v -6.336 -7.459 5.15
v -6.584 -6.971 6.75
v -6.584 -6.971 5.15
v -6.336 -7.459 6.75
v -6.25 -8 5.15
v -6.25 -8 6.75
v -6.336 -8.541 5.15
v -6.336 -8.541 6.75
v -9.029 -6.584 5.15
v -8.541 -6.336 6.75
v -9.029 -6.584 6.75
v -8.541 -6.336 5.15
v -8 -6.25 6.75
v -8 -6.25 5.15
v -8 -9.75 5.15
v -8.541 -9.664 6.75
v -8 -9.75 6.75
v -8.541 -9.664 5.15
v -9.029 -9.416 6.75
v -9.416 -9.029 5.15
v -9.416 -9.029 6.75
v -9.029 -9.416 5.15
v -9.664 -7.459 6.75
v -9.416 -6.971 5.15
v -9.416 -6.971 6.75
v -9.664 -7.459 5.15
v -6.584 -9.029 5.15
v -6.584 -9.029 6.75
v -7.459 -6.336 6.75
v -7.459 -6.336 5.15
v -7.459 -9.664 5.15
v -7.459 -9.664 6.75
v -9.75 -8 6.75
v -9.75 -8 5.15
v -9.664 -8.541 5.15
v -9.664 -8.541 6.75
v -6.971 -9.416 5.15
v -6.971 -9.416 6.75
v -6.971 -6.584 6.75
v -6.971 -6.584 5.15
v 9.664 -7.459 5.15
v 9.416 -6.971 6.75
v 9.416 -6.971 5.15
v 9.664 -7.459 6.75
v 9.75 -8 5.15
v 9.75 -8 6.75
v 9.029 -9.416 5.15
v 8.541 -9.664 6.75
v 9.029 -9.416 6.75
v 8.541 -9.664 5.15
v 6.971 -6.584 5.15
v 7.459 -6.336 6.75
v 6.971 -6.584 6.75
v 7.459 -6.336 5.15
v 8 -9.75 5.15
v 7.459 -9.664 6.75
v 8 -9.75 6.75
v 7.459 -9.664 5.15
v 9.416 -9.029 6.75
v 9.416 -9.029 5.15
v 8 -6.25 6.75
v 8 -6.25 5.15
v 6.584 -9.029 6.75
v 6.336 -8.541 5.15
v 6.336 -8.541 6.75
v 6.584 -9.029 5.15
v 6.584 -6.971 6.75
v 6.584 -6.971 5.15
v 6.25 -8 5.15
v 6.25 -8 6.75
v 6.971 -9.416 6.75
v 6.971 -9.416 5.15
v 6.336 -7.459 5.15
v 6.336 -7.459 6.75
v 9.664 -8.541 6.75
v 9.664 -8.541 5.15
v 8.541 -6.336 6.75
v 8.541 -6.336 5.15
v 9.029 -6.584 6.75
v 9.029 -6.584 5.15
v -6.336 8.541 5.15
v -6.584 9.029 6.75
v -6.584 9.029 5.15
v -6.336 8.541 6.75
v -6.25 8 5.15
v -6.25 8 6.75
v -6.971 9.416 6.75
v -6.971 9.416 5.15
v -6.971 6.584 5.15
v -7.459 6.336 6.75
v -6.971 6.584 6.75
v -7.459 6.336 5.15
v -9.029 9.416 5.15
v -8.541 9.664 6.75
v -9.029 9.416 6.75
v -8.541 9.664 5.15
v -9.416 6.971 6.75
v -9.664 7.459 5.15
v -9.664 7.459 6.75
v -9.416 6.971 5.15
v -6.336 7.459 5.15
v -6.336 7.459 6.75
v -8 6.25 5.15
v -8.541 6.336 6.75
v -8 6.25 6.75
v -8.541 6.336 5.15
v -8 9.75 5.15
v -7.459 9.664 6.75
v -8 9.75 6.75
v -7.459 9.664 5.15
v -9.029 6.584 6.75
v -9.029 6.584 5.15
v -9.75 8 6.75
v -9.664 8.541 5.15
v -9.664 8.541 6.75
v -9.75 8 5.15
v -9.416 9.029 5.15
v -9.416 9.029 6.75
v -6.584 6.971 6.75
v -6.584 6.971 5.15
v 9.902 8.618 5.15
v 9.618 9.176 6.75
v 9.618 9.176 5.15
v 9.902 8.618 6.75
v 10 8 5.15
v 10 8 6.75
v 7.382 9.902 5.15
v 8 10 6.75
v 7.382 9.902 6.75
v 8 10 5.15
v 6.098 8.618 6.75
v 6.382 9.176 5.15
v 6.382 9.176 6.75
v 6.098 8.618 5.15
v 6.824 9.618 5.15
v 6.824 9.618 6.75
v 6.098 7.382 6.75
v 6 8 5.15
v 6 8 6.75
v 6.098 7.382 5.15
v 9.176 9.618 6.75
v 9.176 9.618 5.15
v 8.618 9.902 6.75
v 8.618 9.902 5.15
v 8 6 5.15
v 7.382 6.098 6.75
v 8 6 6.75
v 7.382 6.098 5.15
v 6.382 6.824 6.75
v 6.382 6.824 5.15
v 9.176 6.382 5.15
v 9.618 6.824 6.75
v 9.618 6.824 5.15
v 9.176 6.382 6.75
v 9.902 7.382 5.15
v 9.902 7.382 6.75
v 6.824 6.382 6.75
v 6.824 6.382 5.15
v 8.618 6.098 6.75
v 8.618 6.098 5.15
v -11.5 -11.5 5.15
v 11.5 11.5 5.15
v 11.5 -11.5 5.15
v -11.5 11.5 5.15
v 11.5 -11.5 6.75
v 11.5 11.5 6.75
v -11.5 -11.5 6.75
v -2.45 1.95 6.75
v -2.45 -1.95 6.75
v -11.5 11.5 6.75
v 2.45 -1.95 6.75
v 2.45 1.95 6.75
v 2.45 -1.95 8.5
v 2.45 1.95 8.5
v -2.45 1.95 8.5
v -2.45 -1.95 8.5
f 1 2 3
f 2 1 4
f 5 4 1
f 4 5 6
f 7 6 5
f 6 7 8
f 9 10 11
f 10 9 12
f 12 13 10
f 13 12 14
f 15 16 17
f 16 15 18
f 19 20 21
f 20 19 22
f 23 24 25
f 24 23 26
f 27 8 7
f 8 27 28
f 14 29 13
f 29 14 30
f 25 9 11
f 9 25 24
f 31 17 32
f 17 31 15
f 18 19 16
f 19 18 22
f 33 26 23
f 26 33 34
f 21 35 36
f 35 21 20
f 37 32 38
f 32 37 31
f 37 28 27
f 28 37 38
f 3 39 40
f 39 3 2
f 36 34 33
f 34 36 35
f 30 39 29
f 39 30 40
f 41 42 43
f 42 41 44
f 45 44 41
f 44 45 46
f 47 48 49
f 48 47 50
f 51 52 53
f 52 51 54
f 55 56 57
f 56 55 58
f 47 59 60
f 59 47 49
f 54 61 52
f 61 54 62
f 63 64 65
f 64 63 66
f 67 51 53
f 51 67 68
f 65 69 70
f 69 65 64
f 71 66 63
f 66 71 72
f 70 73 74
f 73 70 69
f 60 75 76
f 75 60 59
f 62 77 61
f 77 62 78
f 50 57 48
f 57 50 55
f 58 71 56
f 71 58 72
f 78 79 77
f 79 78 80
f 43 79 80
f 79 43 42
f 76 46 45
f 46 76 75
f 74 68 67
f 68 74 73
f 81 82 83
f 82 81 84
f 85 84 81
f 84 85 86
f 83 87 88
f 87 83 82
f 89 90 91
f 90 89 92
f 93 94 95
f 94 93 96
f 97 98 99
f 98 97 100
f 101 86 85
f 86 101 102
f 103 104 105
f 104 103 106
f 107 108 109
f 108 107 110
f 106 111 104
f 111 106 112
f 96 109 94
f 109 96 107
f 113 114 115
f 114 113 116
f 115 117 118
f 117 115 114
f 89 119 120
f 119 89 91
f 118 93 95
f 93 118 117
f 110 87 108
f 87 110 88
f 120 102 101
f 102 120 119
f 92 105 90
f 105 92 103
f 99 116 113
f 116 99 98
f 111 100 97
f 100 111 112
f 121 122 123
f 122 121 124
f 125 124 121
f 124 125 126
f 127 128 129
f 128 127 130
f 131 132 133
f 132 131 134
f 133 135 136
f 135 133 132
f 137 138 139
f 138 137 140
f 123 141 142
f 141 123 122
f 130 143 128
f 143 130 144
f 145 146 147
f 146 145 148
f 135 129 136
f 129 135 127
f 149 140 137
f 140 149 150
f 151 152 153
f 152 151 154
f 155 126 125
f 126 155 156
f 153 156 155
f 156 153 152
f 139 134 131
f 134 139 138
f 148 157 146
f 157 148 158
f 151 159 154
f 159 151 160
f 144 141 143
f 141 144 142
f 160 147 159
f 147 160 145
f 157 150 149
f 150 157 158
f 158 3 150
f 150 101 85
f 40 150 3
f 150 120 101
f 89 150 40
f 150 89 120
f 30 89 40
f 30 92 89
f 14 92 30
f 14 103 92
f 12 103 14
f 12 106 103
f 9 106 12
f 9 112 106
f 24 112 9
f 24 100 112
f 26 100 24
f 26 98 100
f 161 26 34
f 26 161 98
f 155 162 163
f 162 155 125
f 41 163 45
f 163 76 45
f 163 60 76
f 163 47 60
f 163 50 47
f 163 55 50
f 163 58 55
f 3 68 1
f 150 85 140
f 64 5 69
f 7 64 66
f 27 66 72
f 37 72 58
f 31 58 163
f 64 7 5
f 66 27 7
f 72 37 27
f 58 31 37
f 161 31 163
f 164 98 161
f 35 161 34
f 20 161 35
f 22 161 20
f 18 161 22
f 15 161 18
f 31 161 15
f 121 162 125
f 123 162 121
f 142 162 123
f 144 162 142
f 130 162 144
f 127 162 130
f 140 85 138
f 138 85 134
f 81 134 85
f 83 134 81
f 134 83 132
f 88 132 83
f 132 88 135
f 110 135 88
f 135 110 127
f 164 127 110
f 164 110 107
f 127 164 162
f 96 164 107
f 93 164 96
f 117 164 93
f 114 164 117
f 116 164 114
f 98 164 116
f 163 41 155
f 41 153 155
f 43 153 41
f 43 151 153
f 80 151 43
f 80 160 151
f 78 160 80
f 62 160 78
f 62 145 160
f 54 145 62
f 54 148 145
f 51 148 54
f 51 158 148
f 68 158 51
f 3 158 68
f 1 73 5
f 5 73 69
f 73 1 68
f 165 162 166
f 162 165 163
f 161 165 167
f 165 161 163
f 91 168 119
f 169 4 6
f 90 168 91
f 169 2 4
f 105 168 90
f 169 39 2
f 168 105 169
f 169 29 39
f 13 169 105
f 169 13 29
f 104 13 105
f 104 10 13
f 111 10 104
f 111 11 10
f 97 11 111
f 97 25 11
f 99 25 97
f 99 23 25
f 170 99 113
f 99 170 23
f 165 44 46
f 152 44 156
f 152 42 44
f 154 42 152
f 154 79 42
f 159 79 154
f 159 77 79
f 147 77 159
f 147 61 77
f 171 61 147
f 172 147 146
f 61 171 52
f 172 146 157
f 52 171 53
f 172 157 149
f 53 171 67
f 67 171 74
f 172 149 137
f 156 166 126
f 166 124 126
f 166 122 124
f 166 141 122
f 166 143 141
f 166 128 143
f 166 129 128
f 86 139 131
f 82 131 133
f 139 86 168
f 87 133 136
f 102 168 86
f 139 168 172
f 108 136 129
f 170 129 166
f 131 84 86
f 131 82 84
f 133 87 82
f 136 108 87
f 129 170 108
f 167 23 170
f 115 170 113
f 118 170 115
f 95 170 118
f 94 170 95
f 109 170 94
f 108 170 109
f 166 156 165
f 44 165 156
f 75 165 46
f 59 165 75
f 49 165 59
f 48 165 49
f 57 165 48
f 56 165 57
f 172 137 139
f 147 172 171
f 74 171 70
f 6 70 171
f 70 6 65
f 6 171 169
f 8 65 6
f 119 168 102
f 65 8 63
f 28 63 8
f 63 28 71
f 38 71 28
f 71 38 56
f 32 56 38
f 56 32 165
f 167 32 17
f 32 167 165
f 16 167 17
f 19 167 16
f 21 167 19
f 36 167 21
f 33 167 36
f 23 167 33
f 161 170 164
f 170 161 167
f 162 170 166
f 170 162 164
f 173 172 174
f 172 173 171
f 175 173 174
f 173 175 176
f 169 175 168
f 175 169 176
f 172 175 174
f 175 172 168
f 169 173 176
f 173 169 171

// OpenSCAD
// file: ../../screw-post/screw-post.scad
//-----------------------------------------------------------------------
// Screw post: a round post off the floor that a board screws down onto
//
// Two ways to fix:
//   "nut"  clearance hole through the post and floor; the nut sits in a hex
//          trap in the floor's underside, so the screw goes in from the top
//   "tap"  a pilot hole the screw cuts its own thread in (one or two fittings
//          in PLA/PETG); blind, the floor stays whole underneath
// and "head" for a screw up from below (head in a counterbore, nut on top).
//
// Modules, all in the same frame:
//   screwPostGhost()     the screw (and nut), for previews
//   screwPost()          the post: add to the floor
//   screwPostFloorCut()  subtract from the floor: nut trap / counterbore and hole
//
// Frame: origin on the floor top, on the post's axis. Z up; the floor is
// Z = -floorThick .. 0. Units: mm.
//
// Sizes: "M2", "M2.5", "M3". screwPostScrew(size, ...) says which screw length
// reaches, so a project can assert it has that screw in the kit.
//-----------------------------------------------------------------------

//-- [name, screw Ø, nut across flats, nut thick, head Ø, head height, tap hole, post Ø]
//-- Nuts ISO 4032; heads ISO 7380 button. Tap holes: the usual ~0.8 x Ø for plastic
screwSizes = [
  ["M2",   2.0, 4.0, 1.6, 3.5, 1.1, 1.6, 5.0],
  ["M2.5", 2.5, 5.0, 2.0, 4.4, 1.4, 2.1, 6.0],    // head 4.4: measured on the kit's M2.5 (controller base)
  ["M3",   3.0, 5.5, 2.4, 5.7, 1.65, 2.5, 7.0],
];

screwHoleClear = 0.4;     // added to the screw Ø for a clearance hole
screwNutClear  = 0.3;     // CAL: across flats, nut trap over the nut. Set by the fit piece
screwTapClear  = 0.0;     // CAL: added to the tap hole. Set by the fit piece
screwHeadClear = 0.6;     // counterbore over the head Ø

function screwSize(size) = let (i = search([size], screwSizes)[0])
  assert(i != [] && i != undef, str("unknown screw size ", size)) screwSizes[i];
function screwDia(size)    = screwSize(size)[1];
function screwNutAF(size)  = screwSize(size)[2];
function screwNutH(size)   = screwSize(size)[3];
function screwHeadDia(size)= screwSize(size)[4];
function screwHeadH(size)  = screwSize(size)[5];
function screwPostDia(size)= screwSize(size)[7];

//-- Shortest screw that fills the nut, from the top of the clamped part (h + clamp
//-- above the floor) down to the nut trap's underside. Round up to a length you have.
function screwPostScrew(size, h, floorThick, clamp = 1.6) = h + clamp + floorThick;

module screwPostGhost(size, h, floorThick, clamp = 1.6, length, how = "nut")
{
  d = screwDia(size);
  L = is_undef(length) ? screwPostScrew(size, h, floorThick, clamp) : length;
  top = h + clamp;
  if (how == "head")
  {
    %color("Silver") translate([0, 0, -floorThick]) cylinder(d = screwHeadDia(size), h = screwHeadH(size), $fn = 24);
    %color("Silver") translate([0, 0, -floorThick + screwHeadH(size)]) cylinder(d = d, h = L, $fn = 16);
  }
  else
  {
    %color("Silver") translate([0, 0, top]) cylinder(d = screwHeadDia(size), h = screwHeadH(size), $fn = 24);
    %color("Silver") translate([0, 0, top - L]) cylinder(d = d, h = L, $fn = 16);
    if (how == "nut")
      %color("DimGray") translate([0, 0, -floorThick]) rotate([0, 0, 30]) cylinder(d = screwNutAF(size)/cos(30), h = screwNutH(size), $fn = 6);
  }
}

//-- how: "nut" | "head" (through hole) or "tap" (blind pilot hole). postDia defaults by size
module screwPost(size, h, how = "nut", postDia, tapClear = screwTapClear)
{
  pd = is_undef(postDia) ? screwPostDia(size) : postDia;
  hole = how == "tap" ? screwSize(size)[6] + tapClear : screwDia(size) + screwHoleClear;
  difference()
  {
    translate([0, 0, -0.01]) cylinder(d = pd, h = h + 0.01, $fn = 40);
    translate([0, 0, how == "tap" ? 0.6 : -1]) cylinder(d = hole, h = h + 2, $fn = 24);
    //-- lead-in so the screw starts square
    translate([0, 0, h - 0.4]) cylinder(d1 = hole, d2 = hole + 0.8, h = 0.41, $fn = 24);
  }
}

//-- "nut": hex trap from the underside, opening a little over the nut so it sits flush.
//-- "head": counterbore for the head. "tap": nothing.
module screwPostFloorCut(size, floorThick, how = "nut", nutClear = screwNutClear)
{
  d = screwDia(size) + screwHoleClear;
  if (how == "nut")
  {
    af = screwNutAF(size) + nutClear;
    translate([0, 0, -floorThick - 1]) rotate([0, 0, 30]) cylinder(d = af/cos(30), h = screwNutH(size) + 0.1 + 1, $fn = 6);
    translate([0, 0, -floorThick - 1]) cylinder(d = d + 0.4, h = floorThick + 2, $fn = 24);
  }
  if (how == "head")
  {
    translate([0, 0, -floorThick - 1]) cylinder(d = screwHeadDia(size) + screwHeadClear, h = screwHeadH(size) + 0.2 + 1, $fn = 32);
    translate([0, 0, -floorThick - 1]) cylinder(d = d + 0.4, h = floorThick + 2, $fn = 24);
  }
  assert(how == "tap" || floorThick >= (how == "nut" ? screwNutH(size) : screwHeadH(size)) + 0.1 + 0.3,
         str("floor too thin for the ", size, " ", how));
}
// file: ../as5600-mount.scad
//-----------------------------------------------------------------------
// AS5600 magnetic encoder board, held under a magnet on a spindle tip
//
// The board lies component side up, the AS5600 facing the magnet above it.
// Four screw posts take its weight: stainless M2.5 screws come UP from below,
// heads in counterbores in the floor's underside, with a stainless washer
// and nut on top of the board (stainless: carbon steel near the magnet
// bends its field). Four corner lips round the board's outline locate it:
// the holes are oversize and not placed well enough to hold the magnet
// axis within 0.25 of the IC, so they only clamp. Round boards get three
// arc lips instead of corners.
//
// The post height comes from the magnet: as56PostH(magnetFaceZ) puts the
// IC's top `gap` below the magnet's face.
//
// Modules, all in the same frame:
//   as56Ghost()      the board, IC and magnet, for previews
//   as56Holder()     the plastic: four posts and the locating lips
//   as56FloorCut()   subtract from the floor: counterbores and holes (and
//                    a slot for header pins pointing down, if asked)
//
// Frame: origin on the floor top, on the magnet axis (the IC's centre).
// Z up; the floor is Z = -floorThick .. 0. Board edges along X and Y.
// Units: mm.
//
// Boards come from as56Boards by name, or pass a row of your own in the
// same layout. Magnets come from as56Magnets by name, or pass a thickness.
//-----------------------------------------------------------------------

use <../screw-post/screw-post.scad>

//-- Boards: [name, shape, size, pcb, holes, hole Ø, screw, source]
//-- shape "rect": size [x, y]; "round": size [Ø]. Holes [x, y] from the IC's centre,
//-- which is the magnet axis; hole Ø one per hole (ghost only: the lips locate).
as56Boards = [
  //-- DollaTek B0BGPF3WT3 / JYUDAUFU B0DJ77DS4J, measured 2026-10-21 (the controller project's parts sheet).
  //-- 3 x Ø3.5 + 1 x Ø4.0 (by DIR); hole edges 1.75 in, so centres 3.5 in, 16.0 pitch; IC centred
  ["as5600-23",  "rect", [23, 23],   1.6, [[-8, -8], [8, -8], [-8, 8], [8, 8]], [3.5, 3.5, 3.5, 4.0], "M2.5", "measured"],
  //-- small breakout, 20 x 13.5, 2 x M3 holes on 15 pitch (vendor listing). CAL: PCB, hole Ø, IC centred
  ["as5600-20",  "rect", [20, 13.5], 1.6, [[-7.5, 0], [7.5, 0]],                [3.2, 3.2],           "M2.5", "V, CAL"],
  //-- round board: placeholder only, no source found. CAL: everything
  ["round-cal",  "round", [20],      1.6, [[-7, 0], [7, 0]],                    [3.2, 3.2],           "M2.5", "CAL"],
];

//-- Magnets: [name, Ø, thickness], diametrically magnetised discs
as56Magnets = [
  ["6x2.5", 6, 2.5],    // the size usually bundled with AS5600 boards. CAL what's in the packs
  ["6x1",   6, 1.0],    // the BOM's separate discs; the controller project's base default. CAL
];

//-- The sensor (AS5600 datasheet)
as56IcL        = 4.9;     // SOIC-8 body
as56IcW        = 3.9;
as56IcH        = 1.75;    // max, PCB to package top
as56Gap        = 1.5;     // magnet face to package top: datasheet 0.5..3; 1.5 mid-range
as56AxisTol    = 0.25;    // magnet axis to IC centre, max (datasheet)

//-- The mount
as56Clearance  = 0.15;    // CAL: per side, board outline to lips. Set by the fit piece
as56LipWall    = 1.6;
as56LipLeg     = 5;       // rect boards: lip length along each edge from a corner
as56LipArc     = 40;      // round boards: degrees per lip, three lips
as56LipH       = 1.0;     // lip top above the PCB underside (under the PCB top: nothing to snag)
as56FloorThick = 2.0;     // takes the M2.5 head counterbore (1.4 head + 0.2, 0.3 left)
as56WasherT    = 0.5;     // M2.5 washer, ISO 7089: Ø6 x 0.5
as56WasherD    = 6.0;
as56HeaderSlot = [17, 9]; // floor opening for header pins out the back: clears the rows at x -6.8 / +6.41

function as56Row(table, name) = let (i = search([name], table)[0])
  assert(i != [] && i != undef, str("unknown AS5600 name ", name)) table[i];
function as56Board(board) = is_string(board) ? as56Row(as56Boards, board) : board;
function as56MagnetT(magnet) = is_string(magnet) ? as56Row(as56Magnets, magnet)[2] : magnet;
function as56MagnetD(magnet) = is_string(magnet) ? as56Row(as56Magnets, magnet)[1] : 6;

//-- Magnet face Z for a magnet stuck on a spindle tip at tipZ (both above the floor top)
function as56MagnetFaceZ(tipZ, magnet = "6x1") = tipZ - as56MagnetT(magnet);
//-- Post height (floor top to PCB underside) that puts the IC's top `gap` under the magnet face
function as56PostH(magnetFaceZ, gap = as56Gap, board = "as5600-23") =
  magnetFaceZ - gap - as56IcH - as56Board(board)[3];
//-- Shortest screw (length under the head) from the head, flush in the floor's underside,
//-- up through the post, PCB, washer and nut. Round up to a length you have
function as56Screw(postH, floorThick = as56FloorThick, board = "as5600-23") =
  let (b = as56Board(board), s = b[6])
  floorThick - screwHeadH(s) + postH + b[3] + as56WasherT + screwNutH(s);
//-- Z of a screw's tip above the floor top: keep it clear of the magnet and spindle
function as56ScrewTipZ(length, floorThick = as56FloorThick, board = "as5600-23") =
  -floorThick + screwHeadH(as56Board(board)[6]) + length;

module as56Outline(board, grow = 0)
{
  b = as56Board(board);
  if (b[1] == "round") offset(r = grow, $fn = 64) circle(d = b[2][0], $fn = 64);
  else offset(delta = grow) square(b[2], center = true);
}

//-- where the lips go: corners of a rect board, three arcs round a round one
module as56LipZones(board, clearance)
{
  b = as56Board(board);
  R = 50;
  if (b[1] == "round")
    for (a = [90, 210, 330]) rotate(a - as56LipArc/2)
      polygon([[0, 0], [R, 0], for (t = [0 : 5 : as56LipArc]) R*[cos(t), sin(t)], R*[cos(as56LipArc), sin(as56LipArc)]]);
  else
    for (sx = [-1, 1], sy = [-1, 1])
    {
      leg = min(as56LipLeg, min(b[2])/2 - 1);
      translate([sx*b[2][0]/2, sy*b[2][1]/2])
        mirror([sx < 0 ? 1 : 0, 0]) mirror([0, sy < 0 ? 1 : 0])
          translate([-leg, -leg]) square([leg + clearance + as56LipWall + 1, leg + clearance + as56LipWall + 1]);
    }
}

//-- postH: floor top to PCB underside (as56PostH). magnetFaceZ: for the ghost's magnet
module as56Ghost(postH, board = "as5600-23", magnet = "6x1", gap = as56Gap)
{
  b = as56Board(board);
  %color("Purple") difference()
  {
    translate([0, 0, postH]) linear_extrude(b[3]) as56Outline(board);
    for (i = [0 : len(b[4]) - 1]) translate([b[4][i][0], b[4][i][1], postH - 1]) cylinder(d = b[5][i], h = b[3] + 2, $fn = 20);
  }
  %color("Black") translate([-as56IcL/2, -as56IcW/2, postH + b[3]]) cube([as56IcL, as56IcW, as56IcH]);
  %color("Silver") translate([0, 0, postH + b[3] + as56IcH + gap]) cylinder(d = as56MagnetD(magnet), h = as56MagnetT(magnet), $fn = 32);
}

module as56Holder(postH, board = "as5600-23", clearance = as56Clearance, lipH = as56LipH)
{
  b = as56Board(board);
  for (h = b[4]) translate([h[0], h[1], 0]) screwPost(b[6], postH, "head");
  //-- lips, sunk 0.01 into the floor so they don't come out as loose bodies
  translate([0, 0, -0.01]) linear_extrude(postH + lipH + 0.01)
    intersection()
    {
      difference() { as56Outline(board, clearance + as56LipWall); as56Outline(board, clearance); }
      as56LipZones(board, clearance);
    }
}

//-- headers: also cut a slot for header pins pointing down out of the board's back
module as56FloorCut(floorThick = as56FloorThick, board = "as5600-23", headers = false)
{
  b = as56Board(board);
  for (h = b[4]) translate([h[0], h[1], 0]) screwPostFloorCut(b[6], floorThick, "head");
  for (h = b[4]) assert(!headers || abs(h[0]) - screwPostDia(b[6])/2 >= as56HeaderSlot[0]/2
                         || abs(h[1]) - screwPostDia(b[6])/2 >= as56HeaderSlot[1]/2, "header slot runs into a post");
  if (headers) translate([-as56HeaderSlot[0]/2, -as56HeaderSlot[1]/2, -floorThick - 1])
    cube([as56HeaderSlot[0], as56HeaderSlot[1], floorThick + 2]);
}
// main file
// The board and its IC as solids, for the catalogue.
include <../as5600-mount.scad>

board = "as5600-23"; tipZ = 11; magnet = "6x1";
postH = as56PostH(as56MagnetFaceZ(tipZ, magnet), board = board);
b = as56Board(board);
difference()
{
  translate([0, 0, postH]) linear_extrude(b[3]) as56Outline(board);
  for (i = [0 : len(b[4]) - 1]) translate([b[4][i][0], b[4][i][1], postH - 1]) cylinder(d = b[5][i], h = b[3] + 2, $fn = 20);
}
translate([-as56IcL/2, -as56IcW/2, postH + b[3] - 0.01]) cube([as56IcL, as56IcW, as56IcH + 0.01]);
